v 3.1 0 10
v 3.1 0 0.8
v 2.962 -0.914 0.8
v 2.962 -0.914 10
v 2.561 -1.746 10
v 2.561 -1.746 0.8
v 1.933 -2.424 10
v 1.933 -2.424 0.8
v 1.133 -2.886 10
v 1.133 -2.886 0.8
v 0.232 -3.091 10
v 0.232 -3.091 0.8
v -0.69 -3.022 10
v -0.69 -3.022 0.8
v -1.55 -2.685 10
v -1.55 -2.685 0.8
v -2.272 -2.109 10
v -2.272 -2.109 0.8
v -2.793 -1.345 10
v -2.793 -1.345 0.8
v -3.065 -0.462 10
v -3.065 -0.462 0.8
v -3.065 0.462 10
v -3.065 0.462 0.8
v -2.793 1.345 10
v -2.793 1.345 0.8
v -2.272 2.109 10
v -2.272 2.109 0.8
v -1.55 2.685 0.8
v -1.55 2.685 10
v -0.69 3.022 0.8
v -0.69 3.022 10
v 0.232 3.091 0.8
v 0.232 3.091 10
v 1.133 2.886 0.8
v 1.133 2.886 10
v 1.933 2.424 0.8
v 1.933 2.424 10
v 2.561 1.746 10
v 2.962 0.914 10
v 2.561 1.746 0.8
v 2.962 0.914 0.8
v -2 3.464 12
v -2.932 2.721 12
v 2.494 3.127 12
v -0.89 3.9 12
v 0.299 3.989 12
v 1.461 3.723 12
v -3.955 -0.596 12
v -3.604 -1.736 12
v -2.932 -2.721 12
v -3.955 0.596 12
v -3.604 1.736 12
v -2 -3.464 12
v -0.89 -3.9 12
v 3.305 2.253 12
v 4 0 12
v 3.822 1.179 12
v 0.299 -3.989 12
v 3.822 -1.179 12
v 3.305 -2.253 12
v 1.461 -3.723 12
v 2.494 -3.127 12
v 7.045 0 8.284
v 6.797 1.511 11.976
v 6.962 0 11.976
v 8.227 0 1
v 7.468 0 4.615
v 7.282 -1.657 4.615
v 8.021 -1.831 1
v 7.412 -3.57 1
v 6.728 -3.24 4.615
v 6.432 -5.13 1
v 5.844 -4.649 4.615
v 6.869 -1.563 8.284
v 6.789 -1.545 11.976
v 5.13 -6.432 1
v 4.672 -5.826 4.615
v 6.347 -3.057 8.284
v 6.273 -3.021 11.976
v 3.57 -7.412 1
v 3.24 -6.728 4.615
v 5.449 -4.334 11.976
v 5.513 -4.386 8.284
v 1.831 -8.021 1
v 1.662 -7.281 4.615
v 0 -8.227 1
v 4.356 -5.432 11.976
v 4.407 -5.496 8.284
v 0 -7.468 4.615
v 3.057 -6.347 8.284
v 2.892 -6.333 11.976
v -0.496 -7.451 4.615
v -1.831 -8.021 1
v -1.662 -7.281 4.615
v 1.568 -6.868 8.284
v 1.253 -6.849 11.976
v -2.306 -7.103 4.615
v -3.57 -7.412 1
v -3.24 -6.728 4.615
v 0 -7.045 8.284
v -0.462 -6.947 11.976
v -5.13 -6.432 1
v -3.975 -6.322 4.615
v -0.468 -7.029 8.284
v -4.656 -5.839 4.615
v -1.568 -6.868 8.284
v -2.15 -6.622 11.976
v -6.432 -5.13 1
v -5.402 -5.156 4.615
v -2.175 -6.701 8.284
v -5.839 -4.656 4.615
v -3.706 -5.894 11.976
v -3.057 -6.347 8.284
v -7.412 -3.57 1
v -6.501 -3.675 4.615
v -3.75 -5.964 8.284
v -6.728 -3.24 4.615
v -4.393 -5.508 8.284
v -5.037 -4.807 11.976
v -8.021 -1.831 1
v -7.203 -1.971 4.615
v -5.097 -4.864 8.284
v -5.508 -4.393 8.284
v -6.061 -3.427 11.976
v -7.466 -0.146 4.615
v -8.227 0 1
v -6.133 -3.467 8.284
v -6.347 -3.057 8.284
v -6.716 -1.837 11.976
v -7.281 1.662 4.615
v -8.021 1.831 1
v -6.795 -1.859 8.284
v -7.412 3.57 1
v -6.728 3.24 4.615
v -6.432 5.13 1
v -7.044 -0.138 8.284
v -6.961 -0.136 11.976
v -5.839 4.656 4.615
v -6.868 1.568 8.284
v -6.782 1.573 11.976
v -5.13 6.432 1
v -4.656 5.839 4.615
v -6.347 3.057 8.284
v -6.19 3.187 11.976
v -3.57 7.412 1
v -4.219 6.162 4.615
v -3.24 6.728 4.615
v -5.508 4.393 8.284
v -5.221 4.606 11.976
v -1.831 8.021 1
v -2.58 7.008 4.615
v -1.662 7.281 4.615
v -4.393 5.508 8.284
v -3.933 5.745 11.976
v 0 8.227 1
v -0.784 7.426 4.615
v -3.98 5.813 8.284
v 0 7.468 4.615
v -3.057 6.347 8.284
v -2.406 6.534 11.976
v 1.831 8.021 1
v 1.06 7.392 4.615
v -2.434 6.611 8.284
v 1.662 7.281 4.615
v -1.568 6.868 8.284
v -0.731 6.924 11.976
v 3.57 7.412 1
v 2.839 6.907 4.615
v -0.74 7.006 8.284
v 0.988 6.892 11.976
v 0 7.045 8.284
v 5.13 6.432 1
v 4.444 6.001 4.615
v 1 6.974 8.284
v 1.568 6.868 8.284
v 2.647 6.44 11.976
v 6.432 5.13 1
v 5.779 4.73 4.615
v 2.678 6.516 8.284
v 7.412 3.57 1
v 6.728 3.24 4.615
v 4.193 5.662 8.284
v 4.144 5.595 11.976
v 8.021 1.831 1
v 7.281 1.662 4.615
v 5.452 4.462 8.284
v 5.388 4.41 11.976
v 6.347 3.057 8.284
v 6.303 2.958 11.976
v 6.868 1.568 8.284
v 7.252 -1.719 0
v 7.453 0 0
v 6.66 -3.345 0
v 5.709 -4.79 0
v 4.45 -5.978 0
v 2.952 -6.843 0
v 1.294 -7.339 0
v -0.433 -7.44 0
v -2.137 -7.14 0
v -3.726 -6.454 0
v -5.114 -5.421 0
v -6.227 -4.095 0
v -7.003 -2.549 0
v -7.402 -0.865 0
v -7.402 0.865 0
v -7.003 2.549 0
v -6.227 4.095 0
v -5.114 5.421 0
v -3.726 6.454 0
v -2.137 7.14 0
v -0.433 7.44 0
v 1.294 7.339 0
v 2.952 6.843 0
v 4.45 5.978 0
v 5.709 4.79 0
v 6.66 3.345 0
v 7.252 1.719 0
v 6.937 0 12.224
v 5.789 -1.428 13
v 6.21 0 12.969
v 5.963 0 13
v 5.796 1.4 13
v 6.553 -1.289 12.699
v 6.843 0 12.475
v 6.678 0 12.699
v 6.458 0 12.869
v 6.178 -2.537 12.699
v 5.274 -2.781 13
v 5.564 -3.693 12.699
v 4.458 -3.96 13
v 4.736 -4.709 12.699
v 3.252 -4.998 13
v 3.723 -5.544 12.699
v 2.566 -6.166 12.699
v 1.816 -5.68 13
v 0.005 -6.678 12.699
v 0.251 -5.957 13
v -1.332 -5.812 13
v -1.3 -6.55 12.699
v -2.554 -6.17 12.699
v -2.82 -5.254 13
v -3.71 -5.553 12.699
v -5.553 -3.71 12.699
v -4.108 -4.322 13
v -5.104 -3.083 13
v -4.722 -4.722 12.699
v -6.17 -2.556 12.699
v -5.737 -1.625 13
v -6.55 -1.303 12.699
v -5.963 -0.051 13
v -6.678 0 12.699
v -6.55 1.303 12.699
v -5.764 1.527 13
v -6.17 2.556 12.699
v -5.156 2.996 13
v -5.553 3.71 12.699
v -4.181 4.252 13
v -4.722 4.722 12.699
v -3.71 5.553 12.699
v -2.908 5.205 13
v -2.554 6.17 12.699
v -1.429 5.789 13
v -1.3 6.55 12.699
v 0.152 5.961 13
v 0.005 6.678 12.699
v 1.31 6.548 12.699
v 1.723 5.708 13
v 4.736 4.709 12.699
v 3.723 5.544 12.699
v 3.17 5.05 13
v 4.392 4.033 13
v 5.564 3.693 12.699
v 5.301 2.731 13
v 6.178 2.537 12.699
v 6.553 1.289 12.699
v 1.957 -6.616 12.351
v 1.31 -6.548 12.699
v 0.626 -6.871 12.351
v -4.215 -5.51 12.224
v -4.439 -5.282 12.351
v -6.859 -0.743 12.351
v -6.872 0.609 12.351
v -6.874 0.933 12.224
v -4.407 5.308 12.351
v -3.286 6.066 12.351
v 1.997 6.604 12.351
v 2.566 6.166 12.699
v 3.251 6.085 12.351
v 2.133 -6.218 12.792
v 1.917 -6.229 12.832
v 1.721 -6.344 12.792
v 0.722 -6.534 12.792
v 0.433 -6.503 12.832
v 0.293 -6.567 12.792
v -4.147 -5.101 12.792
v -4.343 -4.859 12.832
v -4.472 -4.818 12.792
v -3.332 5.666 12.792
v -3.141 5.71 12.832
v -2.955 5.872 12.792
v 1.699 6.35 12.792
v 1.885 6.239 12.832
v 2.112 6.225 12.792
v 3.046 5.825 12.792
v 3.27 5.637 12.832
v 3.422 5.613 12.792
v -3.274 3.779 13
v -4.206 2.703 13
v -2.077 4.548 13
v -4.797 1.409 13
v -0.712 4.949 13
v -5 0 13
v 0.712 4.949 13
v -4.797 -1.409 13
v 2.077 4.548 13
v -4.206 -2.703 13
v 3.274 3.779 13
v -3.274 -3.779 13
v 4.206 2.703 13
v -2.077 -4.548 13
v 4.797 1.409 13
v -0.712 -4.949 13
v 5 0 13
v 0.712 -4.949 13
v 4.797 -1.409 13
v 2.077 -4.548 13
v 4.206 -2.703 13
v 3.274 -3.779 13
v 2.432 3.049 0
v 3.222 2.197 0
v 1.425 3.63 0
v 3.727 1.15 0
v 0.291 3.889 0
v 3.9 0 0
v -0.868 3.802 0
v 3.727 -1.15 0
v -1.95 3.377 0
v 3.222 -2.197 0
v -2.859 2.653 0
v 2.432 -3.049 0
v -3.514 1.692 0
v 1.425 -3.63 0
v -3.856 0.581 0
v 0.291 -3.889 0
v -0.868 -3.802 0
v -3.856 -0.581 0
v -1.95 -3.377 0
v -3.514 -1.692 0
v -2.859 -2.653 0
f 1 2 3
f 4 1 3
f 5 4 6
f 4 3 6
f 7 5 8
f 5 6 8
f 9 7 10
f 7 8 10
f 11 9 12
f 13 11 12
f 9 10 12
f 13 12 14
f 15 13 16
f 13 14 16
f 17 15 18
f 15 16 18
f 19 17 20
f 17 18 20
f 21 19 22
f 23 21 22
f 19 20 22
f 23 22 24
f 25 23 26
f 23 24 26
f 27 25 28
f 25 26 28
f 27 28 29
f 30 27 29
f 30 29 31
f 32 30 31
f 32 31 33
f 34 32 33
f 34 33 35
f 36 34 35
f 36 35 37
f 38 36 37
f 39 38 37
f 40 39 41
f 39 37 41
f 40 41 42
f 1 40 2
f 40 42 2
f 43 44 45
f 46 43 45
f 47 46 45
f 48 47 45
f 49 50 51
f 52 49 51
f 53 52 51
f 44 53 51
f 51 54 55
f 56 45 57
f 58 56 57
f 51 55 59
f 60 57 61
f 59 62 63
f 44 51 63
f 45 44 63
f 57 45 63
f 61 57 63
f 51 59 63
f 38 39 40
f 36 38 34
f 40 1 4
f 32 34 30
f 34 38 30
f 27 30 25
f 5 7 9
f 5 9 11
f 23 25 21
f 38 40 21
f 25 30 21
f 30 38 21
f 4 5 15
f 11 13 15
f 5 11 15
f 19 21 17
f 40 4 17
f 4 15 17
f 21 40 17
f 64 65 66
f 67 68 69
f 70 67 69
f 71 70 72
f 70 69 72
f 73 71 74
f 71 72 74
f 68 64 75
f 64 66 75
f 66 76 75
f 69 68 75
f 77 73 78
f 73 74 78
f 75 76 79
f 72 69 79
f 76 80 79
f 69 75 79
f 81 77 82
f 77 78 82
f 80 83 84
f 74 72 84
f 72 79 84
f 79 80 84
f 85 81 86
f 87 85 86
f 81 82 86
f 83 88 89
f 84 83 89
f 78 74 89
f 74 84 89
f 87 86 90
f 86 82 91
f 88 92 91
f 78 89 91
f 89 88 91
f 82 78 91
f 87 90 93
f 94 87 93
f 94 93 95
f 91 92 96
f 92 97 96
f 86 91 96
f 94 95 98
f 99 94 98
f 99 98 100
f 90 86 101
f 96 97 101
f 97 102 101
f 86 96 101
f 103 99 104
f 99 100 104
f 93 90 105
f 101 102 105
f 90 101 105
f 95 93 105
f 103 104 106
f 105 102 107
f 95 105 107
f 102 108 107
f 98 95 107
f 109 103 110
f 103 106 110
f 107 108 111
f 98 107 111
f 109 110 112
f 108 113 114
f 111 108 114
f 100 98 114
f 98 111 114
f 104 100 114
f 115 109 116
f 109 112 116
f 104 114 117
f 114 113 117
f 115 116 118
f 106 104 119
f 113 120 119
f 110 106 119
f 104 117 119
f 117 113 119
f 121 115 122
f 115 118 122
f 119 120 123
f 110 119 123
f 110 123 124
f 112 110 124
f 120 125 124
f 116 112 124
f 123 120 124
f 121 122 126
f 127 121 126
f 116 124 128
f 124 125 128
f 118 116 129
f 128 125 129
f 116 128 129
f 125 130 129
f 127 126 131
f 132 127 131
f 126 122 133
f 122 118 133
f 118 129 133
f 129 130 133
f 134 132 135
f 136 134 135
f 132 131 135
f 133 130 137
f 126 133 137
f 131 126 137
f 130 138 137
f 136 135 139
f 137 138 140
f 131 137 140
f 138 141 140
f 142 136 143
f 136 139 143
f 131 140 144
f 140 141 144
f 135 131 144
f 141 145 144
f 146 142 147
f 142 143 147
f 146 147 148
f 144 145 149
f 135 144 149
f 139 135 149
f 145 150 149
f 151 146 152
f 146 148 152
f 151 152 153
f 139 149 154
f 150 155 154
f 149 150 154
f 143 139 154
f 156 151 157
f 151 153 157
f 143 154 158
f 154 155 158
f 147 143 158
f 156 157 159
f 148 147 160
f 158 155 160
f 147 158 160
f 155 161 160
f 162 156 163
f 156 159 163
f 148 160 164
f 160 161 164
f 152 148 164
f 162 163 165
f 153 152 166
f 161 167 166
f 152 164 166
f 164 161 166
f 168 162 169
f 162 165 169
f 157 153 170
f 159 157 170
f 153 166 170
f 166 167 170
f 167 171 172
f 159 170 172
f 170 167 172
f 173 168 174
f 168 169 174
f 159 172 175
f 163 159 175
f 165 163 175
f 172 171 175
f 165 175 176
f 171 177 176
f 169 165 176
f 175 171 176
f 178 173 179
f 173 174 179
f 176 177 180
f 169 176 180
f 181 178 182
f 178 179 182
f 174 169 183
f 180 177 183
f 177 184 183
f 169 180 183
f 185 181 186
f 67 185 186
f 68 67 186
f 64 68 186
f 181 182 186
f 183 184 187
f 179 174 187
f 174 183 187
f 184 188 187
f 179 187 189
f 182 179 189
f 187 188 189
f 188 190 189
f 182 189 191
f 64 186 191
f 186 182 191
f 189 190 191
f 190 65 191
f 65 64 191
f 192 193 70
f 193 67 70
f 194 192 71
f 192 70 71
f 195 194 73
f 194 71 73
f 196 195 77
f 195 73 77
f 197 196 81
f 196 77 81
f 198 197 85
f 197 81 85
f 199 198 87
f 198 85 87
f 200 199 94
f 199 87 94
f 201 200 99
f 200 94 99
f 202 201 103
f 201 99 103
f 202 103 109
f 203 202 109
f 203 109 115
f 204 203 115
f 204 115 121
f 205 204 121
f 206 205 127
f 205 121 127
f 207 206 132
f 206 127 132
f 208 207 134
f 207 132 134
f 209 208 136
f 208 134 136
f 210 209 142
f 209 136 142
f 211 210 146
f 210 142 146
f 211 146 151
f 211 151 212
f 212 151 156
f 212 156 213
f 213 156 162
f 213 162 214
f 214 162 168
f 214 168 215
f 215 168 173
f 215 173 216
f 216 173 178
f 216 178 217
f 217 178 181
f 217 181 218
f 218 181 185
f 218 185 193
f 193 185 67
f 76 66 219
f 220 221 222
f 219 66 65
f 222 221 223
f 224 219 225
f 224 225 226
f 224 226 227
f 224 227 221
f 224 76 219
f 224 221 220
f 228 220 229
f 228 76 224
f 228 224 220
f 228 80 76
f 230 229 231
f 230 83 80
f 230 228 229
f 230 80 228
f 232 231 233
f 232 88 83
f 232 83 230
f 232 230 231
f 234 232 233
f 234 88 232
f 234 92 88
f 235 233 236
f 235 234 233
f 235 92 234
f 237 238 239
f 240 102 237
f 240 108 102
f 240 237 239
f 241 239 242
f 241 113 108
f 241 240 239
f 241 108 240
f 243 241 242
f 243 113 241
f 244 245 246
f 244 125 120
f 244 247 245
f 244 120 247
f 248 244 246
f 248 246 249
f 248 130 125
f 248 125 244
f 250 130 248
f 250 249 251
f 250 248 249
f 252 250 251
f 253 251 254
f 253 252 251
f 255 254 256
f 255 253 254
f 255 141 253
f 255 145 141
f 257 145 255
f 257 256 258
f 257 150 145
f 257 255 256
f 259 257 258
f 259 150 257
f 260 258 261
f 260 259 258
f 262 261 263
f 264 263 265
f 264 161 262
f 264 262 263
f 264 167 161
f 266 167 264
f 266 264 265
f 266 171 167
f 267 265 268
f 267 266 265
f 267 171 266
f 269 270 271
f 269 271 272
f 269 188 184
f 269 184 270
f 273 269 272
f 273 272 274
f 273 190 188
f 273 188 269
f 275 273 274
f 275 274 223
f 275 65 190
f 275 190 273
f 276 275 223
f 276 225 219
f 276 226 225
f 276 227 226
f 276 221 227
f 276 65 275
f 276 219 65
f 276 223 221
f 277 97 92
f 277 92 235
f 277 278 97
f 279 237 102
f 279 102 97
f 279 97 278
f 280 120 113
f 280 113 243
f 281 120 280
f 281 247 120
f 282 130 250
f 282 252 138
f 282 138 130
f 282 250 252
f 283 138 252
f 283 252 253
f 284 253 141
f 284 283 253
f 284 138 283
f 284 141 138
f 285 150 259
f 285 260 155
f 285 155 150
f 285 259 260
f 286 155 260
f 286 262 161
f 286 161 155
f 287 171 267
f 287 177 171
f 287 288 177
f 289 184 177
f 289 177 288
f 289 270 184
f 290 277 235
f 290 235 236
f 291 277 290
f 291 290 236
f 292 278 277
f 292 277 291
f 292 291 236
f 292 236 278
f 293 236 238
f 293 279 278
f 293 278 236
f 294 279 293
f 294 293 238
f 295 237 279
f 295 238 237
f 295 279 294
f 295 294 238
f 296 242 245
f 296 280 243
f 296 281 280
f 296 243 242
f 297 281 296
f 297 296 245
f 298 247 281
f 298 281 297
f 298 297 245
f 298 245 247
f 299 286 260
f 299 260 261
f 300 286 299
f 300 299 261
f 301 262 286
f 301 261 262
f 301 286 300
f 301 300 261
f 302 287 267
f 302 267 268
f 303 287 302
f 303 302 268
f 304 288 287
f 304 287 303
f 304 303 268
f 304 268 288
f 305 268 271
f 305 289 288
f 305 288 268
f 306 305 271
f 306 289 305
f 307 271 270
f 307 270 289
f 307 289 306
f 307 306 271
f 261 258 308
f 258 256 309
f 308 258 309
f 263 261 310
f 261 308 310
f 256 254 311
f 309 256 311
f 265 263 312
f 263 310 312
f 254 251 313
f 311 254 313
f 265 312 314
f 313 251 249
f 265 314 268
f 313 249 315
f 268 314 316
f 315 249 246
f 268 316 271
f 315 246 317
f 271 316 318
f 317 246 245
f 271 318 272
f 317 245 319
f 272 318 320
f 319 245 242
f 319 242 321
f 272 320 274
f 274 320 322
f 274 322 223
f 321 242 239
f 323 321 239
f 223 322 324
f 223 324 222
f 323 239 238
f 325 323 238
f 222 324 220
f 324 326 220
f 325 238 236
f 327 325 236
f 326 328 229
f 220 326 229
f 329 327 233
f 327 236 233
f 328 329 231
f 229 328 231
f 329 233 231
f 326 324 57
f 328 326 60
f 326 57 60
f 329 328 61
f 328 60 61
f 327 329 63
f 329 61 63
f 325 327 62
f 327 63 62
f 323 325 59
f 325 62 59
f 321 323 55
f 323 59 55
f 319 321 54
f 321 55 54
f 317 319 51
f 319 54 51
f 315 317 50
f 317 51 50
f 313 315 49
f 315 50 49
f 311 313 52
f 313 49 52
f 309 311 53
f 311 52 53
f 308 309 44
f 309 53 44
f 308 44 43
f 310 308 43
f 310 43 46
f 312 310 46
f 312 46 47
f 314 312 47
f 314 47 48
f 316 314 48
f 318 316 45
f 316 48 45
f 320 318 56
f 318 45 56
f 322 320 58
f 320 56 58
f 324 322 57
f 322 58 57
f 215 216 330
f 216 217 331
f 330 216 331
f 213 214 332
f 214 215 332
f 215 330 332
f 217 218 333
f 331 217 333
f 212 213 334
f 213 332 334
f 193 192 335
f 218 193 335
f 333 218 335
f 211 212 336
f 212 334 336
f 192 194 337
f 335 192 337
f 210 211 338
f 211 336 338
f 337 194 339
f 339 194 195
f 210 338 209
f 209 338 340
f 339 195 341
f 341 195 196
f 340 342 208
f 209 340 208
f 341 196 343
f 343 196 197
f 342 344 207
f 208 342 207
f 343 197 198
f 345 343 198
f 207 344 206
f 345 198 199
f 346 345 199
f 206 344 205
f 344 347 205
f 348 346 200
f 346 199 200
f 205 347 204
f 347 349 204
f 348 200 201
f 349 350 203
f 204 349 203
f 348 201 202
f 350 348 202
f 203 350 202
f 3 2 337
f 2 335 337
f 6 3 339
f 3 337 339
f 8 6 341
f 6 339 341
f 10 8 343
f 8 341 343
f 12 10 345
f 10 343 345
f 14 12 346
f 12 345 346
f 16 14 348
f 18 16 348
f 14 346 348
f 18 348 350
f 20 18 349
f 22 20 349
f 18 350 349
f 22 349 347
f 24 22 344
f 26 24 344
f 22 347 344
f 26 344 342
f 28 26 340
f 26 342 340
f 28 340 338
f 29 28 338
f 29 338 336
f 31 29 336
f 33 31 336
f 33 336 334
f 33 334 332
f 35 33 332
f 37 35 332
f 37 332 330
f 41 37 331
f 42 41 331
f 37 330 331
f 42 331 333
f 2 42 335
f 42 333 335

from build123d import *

# Parameters (mm, degrees)
F4_R = 1


# Not quite as in the source:
# - a fillet or chamfer that OpenCascade refuses, or shapes differently, is made with other operations: its cross-section is extruded or revolved along the edge and cut away or added


with BuildPart() as f1:
    # F0 (on Front) → F1 (revolve)
    with BuildSketch(Plane.XZ):
        with BuildLine():
            Line((0, 12), (0, 10))
            Line((0, 10), (3.1, 10))
            Line((3.1, 10), (3.1, 0))
            Line((3.1, 0), (8.5, 0))
            ThreePointArc((8.5, 0), (7.2147663015, 6.4382422656), (7, 13))
            Line((7, 13), (5, 13))
            Line((5, 13), (4, 12))
            Line((4, 12), (0, 12))
        make_face()
    revolve(axis=Axis((0, 0, 11), (0, 0, -1)))

    # F3: chamfer of 0.8 on 2 edges, made by hand

    # F3_s1 → F3_t2 (revolve, cut)
    with BuildSketch(Plane.XZ):
        Polygon((3.1, 0.8), (3.9, 0), (3.1, 0), align=None)
    revolve(axis=Axis((0, 0, 0), (0, 0, -1)), mode=Mode.SUBTRACT)

    # F3_s3 → F3_t4 (revolve, cut)
    with BuildSketch(Plane.XZ):
        with BuildLine():
            Line((7.4526927913, 0), (8.2271718294, 1.0004550311))
            ThreePointArc((8.2271718294, 1.0004550311), (8.3578103434, 0.5086375801), (8.5, 0))
            Line((8.5, 0), (7.4526927913, 0))
        make_face()
    revolve(axis=Axis((0, 0, 0), (0, 0, -1)), mode=Mode.SUBTRACT)

    # F4
    f4_edges = [f1.edges().sort_by_distance(p)[0] for p in [
        (-7, 0, 13),
    ]]
    fillet(f4_edges, radius=F4_R)


solid = f1.part
